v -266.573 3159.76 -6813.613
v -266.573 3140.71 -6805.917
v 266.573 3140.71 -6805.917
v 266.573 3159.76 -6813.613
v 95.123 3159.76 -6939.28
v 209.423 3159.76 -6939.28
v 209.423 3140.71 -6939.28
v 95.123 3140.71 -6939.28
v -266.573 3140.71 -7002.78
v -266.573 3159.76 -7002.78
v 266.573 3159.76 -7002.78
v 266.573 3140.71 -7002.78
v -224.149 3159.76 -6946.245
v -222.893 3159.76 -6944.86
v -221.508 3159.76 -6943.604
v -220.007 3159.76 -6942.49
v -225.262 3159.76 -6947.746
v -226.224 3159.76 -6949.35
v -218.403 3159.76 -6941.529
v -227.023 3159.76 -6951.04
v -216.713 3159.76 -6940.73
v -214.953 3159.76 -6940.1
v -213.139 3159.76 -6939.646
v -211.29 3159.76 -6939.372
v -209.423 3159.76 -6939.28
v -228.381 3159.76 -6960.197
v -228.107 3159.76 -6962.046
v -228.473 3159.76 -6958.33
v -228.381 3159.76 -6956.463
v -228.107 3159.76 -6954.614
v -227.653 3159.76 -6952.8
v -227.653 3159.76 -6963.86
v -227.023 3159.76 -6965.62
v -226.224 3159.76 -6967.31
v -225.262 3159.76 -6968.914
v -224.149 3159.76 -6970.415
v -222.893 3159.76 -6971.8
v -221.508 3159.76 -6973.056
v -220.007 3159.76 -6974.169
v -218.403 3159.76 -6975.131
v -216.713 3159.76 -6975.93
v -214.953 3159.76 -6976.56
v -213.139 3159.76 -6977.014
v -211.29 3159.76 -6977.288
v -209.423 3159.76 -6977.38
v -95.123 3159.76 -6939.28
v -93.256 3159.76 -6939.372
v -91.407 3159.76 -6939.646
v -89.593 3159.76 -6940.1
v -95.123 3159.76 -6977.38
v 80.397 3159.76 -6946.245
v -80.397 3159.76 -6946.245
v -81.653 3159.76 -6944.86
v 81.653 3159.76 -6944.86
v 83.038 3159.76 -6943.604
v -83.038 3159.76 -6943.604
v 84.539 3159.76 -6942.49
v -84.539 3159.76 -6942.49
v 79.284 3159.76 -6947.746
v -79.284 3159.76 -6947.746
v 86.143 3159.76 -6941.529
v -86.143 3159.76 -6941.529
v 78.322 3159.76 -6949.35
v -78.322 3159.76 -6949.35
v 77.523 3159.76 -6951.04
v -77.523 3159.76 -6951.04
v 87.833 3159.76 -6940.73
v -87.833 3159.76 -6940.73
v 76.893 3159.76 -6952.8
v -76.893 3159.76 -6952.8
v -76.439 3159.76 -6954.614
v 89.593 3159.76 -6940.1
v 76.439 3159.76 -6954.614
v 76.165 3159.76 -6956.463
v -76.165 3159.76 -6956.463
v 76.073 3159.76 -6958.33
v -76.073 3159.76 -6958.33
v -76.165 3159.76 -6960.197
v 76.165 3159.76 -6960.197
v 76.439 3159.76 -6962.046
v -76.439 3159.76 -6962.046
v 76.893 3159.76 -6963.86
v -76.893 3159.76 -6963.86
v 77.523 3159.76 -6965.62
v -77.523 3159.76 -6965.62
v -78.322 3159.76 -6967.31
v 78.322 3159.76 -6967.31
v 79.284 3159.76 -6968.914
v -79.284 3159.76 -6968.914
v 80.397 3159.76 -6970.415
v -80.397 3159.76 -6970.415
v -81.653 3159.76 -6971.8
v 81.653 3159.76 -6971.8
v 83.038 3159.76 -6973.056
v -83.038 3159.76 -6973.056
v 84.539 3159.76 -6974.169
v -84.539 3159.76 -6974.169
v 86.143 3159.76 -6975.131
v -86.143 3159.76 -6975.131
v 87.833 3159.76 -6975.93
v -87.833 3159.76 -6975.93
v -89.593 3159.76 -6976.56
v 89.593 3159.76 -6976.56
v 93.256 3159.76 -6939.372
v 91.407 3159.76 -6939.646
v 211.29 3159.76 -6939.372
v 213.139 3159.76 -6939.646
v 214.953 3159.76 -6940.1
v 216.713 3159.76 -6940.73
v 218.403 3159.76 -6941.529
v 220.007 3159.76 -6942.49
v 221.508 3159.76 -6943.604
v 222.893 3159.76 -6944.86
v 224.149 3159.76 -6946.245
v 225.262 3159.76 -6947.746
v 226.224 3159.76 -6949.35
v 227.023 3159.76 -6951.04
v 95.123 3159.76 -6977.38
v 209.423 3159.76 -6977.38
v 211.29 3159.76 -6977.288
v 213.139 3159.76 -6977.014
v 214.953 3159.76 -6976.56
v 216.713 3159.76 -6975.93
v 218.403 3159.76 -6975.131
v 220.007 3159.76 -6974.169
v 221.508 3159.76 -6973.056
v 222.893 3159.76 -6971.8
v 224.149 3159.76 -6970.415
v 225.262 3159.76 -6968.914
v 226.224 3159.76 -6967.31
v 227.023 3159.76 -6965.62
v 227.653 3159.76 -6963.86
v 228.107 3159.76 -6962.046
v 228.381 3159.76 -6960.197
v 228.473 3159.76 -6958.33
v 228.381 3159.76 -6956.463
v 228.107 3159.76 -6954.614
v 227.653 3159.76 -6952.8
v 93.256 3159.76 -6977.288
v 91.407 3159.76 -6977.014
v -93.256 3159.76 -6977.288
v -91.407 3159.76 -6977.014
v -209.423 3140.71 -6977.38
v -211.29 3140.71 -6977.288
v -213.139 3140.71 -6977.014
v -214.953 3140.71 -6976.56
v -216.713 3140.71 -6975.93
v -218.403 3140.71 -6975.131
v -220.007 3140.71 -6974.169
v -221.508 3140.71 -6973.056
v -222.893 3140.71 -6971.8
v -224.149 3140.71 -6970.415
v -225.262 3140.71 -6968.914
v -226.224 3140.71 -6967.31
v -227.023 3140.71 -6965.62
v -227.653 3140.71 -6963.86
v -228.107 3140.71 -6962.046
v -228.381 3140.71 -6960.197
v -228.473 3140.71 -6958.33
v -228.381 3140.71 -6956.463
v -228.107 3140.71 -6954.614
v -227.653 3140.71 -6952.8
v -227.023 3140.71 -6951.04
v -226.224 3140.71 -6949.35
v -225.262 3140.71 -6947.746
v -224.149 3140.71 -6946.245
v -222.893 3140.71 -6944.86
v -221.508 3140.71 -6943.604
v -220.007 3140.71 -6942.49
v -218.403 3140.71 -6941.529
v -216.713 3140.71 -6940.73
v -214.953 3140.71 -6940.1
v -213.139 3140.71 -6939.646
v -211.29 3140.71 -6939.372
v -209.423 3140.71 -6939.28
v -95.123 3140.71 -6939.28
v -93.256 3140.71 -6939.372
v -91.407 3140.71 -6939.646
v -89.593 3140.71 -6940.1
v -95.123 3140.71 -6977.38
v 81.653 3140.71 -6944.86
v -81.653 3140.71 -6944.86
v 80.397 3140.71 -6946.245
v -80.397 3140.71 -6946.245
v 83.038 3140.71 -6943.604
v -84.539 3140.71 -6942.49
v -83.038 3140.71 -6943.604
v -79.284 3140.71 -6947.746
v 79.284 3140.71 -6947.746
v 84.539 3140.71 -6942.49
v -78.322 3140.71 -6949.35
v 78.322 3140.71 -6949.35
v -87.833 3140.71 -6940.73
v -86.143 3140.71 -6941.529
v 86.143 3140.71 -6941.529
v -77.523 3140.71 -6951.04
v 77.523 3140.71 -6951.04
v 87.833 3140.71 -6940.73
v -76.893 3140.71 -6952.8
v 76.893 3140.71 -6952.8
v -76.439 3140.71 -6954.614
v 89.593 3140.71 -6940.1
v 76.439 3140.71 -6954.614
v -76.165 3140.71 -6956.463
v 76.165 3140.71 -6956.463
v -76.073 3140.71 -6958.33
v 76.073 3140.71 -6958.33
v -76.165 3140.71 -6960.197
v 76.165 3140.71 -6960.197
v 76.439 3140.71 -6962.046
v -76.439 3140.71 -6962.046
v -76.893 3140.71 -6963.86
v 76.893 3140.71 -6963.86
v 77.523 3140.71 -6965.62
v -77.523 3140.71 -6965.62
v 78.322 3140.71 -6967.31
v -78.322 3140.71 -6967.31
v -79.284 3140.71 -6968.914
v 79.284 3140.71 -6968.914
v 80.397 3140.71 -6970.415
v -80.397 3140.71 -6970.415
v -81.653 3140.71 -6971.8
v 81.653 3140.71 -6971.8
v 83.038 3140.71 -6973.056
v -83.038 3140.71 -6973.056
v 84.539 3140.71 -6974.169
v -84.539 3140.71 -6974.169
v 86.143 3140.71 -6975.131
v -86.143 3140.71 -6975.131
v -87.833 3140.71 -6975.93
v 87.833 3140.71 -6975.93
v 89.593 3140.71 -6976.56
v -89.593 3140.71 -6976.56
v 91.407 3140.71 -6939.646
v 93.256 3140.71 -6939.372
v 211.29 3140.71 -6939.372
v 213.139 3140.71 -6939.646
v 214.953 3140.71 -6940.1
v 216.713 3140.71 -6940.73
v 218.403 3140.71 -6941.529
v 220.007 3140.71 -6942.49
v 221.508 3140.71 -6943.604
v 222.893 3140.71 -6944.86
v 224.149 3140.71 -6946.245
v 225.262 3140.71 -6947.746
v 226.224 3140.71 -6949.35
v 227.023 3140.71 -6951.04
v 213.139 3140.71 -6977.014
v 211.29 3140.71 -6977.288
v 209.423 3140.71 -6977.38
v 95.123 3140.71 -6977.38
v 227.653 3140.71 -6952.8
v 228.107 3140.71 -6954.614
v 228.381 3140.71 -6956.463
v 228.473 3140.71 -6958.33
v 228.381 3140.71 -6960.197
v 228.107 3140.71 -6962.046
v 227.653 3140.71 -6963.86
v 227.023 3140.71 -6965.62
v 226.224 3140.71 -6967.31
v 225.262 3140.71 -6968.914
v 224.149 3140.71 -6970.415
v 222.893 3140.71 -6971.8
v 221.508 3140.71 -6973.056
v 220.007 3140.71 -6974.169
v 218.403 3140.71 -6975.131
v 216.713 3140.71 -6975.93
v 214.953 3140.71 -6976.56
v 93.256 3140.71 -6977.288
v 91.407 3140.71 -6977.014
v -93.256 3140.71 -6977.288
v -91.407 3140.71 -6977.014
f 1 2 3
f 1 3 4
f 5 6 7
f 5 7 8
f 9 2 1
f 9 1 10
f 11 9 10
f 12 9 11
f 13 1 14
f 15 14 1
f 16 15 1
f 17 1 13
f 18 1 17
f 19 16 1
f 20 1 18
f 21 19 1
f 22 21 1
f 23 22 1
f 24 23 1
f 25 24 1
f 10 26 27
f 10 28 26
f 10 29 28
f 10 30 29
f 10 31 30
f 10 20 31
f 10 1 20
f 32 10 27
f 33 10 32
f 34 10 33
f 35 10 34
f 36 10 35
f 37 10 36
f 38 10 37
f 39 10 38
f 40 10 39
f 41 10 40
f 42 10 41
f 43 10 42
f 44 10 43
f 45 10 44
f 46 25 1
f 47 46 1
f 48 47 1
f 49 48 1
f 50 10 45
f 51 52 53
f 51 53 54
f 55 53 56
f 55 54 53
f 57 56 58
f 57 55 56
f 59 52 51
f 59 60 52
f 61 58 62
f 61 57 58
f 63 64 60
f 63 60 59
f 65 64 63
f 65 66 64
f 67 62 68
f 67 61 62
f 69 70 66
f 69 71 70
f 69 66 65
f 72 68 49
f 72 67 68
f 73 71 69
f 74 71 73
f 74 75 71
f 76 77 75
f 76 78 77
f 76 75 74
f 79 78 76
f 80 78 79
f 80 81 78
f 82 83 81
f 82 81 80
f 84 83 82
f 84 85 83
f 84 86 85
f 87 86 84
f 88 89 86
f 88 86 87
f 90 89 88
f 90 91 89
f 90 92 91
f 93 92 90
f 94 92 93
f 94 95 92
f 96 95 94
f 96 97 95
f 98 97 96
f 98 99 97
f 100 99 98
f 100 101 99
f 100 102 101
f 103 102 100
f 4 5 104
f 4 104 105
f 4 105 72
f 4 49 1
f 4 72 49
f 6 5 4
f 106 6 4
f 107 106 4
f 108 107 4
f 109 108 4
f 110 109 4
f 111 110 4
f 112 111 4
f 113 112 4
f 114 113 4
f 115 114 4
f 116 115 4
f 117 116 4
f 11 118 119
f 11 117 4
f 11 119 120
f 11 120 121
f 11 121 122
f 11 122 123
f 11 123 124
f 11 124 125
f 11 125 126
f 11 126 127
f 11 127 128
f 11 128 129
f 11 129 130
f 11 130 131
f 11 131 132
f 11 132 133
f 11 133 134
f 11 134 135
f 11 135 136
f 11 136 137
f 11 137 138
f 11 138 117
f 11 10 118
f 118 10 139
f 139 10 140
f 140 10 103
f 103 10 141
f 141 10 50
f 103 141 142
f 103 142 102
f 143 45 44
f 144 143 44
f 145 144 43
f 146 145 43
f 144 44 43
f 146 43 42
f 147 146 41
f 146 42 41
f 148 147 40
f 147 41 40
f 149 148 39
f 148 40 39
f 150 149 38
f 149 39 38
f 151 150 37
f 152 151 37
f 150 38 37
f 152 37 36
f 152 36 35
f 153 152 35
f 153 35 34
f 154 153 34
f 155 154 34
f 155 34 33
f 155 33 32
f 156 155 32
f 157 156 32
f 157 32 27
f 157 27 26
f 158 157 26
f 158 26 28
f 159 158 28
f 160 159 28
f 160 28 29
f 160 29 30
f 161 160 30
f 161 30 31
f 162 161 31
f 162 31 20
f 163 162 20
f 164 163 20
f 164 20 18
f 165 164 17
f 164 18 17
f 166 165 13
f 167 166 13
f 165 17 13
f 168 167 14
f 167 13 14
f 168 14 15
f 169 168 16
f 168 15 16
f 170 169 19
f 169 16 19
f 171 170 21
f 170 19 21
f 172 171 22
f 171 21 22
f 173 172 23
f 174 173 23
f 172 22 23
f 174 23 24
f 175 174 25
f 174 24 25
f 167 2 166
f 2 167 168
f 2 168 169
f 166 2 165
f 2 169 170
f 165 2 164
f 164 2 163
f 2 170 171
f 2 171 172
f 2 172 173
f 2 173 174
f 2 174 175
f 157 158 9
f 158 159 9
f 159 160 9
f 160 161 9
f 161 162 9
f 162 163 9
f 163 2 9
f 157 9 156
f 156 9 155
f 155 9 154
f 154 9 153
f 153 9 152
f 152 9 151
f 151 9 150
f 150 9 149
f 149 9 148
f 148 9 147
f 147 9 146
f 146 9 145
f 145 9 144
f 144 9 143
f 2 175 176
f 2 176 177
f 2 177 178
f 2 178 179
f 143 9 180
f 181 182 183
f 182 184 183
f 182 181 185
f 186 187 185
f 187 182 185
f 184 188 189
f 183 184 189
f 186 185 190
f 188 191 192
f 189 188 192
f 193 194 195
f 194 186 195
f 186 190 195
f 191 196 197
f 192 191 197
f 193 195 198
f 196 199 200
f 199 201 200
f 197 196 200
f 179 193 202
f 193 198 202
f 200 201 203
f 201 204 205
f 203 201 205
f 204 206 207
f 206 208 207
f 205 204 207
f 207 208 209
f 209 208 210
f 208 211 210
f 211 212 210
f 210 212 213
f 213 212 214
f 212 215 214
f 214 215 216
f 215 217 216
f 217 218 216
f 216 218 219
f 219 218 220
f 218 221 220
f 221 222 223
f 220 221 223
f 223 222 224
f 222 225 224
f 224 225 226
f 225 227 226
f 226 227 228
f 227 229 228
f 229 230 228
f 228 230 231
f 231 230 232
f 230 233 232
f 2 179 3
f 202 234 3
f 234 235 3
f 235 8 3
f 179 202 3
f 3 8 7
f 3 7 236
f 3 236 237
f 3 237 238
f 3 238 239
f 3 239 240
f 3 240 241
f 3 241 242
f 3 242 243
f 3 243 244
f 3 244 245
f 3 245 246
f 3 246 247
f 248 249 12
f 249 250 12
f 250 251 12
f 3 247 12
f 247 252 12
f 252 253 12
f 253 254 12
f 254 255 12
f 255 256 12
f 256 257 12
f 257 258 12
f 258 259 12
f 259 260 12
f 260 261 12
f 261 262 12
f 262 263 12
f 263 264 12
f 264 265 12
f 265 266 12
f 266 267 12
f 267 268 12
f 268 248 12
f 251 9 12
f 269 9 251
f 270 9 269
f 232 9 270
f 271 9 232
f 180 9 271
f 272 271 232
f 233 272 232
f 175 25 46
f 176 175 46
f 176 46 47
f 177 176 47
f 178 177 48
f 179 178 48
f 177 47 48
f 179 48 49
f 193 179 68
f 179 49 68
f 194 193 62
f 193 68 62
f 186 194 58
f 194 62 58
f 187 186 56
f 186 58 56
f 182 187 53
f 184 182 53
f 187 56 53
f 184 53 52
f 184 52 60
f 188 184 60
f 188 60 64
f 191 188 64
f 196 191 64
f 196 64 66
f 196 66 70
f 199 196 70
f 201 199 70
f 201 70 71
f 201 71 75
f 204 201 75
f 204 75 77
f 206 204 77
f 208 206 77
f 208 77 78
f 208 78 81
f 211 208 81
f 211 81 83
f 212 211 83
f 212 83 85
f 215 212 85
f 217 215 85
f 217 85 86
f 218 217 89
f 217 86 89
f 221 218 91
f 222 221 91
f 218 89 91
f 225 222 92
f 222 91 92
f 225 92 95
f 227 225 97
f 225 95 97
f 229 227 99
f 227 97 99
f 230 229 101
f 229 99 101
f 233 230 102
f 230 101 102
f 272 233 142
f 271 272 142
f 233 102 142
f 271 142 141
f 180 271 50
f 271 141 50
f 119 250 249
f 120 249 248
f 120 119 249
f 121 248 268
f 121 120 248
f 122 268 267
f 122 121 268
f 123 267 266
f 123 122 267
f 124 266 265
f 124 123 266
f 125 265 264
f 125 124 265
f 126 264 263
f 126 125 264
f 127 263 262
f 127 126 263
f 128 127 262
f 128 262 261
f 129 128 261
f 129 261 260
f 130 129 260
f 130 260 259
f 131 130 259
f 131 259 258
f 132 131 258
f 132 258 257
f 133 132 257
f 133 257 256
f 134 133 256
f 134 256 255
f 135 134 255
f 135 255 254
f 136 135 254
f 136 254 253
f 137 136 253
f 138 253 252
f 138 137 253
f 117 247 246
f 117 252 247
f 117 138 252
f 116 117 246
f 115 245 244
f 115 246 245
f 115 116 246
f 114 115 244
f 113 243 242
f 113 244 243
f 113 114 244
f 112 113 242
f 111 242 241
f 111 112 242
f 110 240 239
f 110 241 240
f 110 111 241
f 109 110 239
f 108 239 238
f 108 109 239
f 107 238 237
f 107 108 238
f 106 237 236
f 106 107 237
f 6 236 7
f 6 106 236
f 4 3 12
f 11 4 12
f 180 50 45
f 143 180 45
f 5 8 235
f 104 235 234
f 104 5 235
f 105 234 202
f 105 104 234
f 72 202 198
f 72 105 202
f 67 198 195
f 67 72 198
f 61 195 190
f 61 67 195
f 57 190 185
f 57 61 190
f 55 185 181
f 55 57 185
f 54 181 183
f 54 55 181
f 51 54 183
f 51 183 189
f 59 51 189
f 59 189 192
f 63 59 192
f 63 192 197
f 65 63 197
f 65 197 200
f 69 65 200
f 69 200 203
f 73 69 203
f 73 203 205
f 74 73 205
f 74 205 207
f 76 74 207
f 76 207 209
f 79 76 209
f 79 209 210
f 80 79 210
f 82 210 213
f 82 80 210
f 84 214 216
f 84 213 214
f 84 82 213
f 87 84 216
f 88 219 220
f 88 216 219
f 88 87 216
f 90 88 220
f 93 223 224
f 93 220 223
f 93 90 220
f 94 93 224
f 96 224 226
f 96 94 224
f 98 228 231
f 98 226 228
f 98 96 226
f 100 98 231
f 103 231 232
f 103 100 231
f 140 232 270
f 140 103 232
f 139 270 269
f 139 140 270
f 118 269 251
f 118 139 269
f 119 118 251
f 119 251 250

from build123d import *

# Parameters (mm, degrees)
SKETCH1_W           = 533.146
SKETCH1_H           = 196.863399688
BOSS_EXTRUDE1_DEPTH = 19.05
CUT_EXTRUDE1_DEPTH  = 7702.120410186
CUT_EXTRUDE2_DEPTH  = 7008.877833132


with BuildPart() as part:
    # Sketch1 → Boss-Extrude1 (new body)
    with BuildSketch(Plane(origin=(0, 3140.71, 0), x_dir=(1, 0, 0), z_dir=(0, 1, 0))):
        with Locations((0, 6904.348295077)):
            Rectangle(SKETCH1_W, SKETCH1_H)
    extrude(amount=BOSS_EXTRUDE1_DEPTH)

    # Sketch2 → Cut-Extrude1 (cut, through all)
    with BuildSketch(Plane(origin=(266.573, 0, 0), x_dir=(0, 0, -1), z_dir=(1, 0, 0))):
        Polygon((6805.916595233, 3140.710000001), (6813.613294835, 3159.760000001), (6805.916595233, 3159.760000001), align=None)
    extrude(amount=-CUT_EXTRUDE1_DEPTH, mode=Mode.SUBTRACT)

    # Sketch3 → Cut-Extrude2 (cut, through all)
    with BuildSketch(Plane(origin=(0, 3159.76, 0), x_dir=(1, 0, 0), z_dir=(0, 1, 0))):
        with BuildLine():
            Line((209.423, 6939.279994921), (95.123, 6939.279994921))
            ThreePointArc((95.123, 6939.279994921), (76.073, 6958.329994921), (95.123, 6977.379994921))
            Line((95.123, 6977.379994921), (209.423, 6977.379994921))
            ThreePointArc((209.423, 6977.379994921), (228.473, 6958.329994921), (209.423, 6939.279994921))
        make_face()
        with BuildLine():
            Line((-209.423, 6939.279994921), (-95.123, 6939.279994921))
            ThreePointArc((-95.123, 6939.279994921), (-76.073, 6958.329994921), (-95.123, 6977.379994921))
            Line((-95.123, 6977.379994921), (-209.423, 6977.379994921))
            ThreePointArc((-209.423, 6977.379994921), (-228.473, 6958.329994921), (-209.423, 6939.279994921))
        make_face()
    extrude(amount=-CUT_EXTRUDE2_DEPTH, mode=Mode.SUBTRACT)


solid = part.part
